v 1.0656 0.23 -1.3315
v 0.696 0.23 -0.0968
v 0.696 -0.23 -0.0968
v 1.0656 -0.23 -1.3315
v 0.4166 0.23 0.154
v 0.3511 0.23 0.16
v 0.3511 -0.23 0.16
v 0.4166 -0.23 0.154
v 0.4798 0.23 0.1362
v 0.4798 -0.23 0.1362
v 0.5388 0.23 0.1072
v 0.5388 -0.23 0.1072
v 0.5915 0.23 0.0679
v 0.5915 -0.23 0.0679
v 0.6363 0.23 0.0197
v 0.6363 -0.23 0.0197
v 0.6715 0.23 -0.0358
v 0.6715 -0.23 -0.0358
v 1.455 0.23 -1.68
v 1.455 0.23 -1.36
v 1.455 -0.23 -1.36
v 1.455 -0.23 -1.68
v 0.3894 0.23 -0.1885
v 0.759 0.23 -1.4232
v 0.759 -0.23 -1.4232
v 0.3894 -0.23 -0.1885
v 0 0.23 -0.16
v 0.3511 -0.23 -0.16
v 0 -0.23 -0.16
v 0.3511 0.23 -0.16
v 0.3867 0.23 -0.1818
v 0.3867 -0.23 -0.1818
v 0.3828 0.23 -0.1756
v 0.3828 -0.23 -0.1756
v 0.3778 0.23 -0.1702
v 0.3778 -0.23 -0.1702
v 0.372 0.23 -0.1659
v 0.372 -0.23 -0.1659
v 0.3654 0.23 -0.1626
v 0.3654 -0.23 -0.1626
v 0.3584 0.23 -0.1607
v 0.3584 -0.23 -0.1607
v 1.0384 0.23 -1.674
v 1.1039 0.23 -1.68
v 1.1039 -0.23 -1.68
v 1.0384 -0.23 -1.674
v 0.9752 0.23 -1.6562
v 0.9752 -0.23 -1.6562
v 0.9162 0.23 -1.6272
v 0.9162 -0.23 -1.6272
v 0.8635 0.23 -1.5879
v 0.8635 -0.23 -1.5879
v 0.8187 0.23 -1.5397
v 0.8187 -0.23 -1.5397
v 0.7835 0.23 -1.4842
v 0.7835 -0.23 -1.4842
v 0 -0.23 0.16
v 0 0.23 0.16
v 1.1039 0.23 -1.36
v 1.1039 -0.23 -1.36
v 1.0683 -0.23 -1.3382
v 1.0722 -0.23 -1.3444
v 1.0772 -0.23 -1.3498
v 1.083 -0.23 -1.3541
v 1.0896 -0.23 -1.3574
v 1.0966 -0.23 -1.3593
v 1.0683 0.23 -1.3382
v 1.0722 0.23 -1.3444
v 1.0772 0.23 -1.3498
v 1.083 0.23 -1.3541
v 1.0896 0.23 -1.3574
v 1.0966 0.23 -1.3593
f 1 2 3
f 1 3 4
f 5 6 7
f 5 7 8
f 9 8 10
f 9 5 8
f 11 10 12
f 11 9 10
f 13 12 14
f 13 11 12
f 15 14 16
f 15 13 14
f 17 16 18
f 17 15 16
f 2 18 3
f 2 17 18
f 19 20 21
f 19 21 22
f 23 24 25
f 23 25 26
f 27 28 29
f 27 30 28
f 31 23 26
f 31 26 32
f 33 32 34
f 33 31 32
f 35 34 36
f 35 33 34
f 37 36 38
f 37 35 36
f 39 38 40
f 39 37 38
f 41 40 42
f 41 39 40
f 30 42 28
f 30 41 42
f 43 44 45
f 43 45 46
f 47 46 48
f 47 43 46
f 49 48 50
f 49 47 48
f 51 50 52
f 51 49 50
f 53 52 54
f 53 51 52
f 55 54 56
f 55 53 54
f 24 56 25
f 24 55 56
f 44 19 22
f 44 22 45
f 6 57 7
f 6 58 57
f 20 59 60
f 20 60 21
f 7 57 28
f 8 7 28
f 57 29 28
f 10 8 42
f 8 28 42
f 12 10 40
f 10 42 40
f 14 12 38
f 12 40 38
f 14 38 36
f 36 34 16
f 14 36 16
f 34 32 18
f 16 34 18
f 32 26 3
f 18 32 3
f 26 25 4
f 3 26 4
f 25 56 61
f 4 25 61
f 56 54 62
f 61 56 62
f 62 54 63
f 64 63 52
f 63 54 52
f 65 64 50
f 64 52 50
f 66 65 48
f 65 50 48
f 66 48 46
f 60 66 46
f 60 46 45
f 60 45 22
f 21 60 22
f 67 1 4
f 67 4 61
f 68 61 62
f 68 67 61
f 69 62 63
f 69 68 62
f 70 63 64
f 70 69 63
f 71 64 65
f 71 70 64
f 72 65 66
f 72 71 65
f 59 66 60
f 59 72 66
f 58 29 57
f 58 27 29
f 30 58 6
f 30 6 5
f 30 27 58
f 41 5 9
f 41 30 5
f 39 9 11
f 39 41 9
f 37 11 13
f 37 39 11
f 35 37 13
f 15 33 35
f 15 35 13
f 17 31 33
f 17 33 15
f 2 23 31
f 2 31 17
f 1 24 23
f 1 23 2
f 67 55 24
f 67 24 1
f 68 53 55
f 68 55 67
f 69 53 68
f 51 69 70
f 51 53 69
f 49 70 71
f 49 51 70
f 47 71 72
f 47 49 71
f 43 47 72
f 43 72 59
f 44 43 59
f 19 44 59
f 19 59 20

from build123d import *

# Parameters (mm, degrees)
BOSS_EXTRUDE1_DEPTH = 0.23


with BuildPart() as part:
    # Sketch1 → Boss-Extrude1 (new body, symmetric)
    with BuildSketch(Plane(origin=(0, 0, 0), x_dir=(1, 0, 0), z_dir=(0, 1, 0))):
        with BuildLine():
            Line((0, -0.16), (0.351100062, -0.16))
            ThreePointArc((0.351100062, -0.16), (0.566082222, -0.088760577), (0.69597991, 0.09676294))
            Line((0.69597991, 0.09676294), (1.065579955, 1.331470784))
            ThreePointArc((1.065579955, 1.331470784), (1.080013032, 1.352084509), (1.103899938, 1.36))
            Line((1.103899938, 1.36), (1.455, 1.36))
            Line((1.455, 1.36), (1.455, 1.68))
            Line((1.455, 1.68), (1.103899938, 1.68))
            ThreePointArc((1.103899938, 1.68), (0.888917778, 1.608760577), (0.75902009, 1.42323706))
            Line((0.75902009, 1.42323706), (0.389420045, 0.188529216))
            ThreePointArc((0.389420045, 0.188529216), (0.374986968, 0.167915491), (0.351100062, 0.16))
            Line((0.351100062, 0.16), (0, 0.16))
            Line((0, 0.16), (0, -0.16))
        make_face()
    extrude(amount=BOSS_EXTRUDE1_DEPTH, both=True)


solid = part.part
